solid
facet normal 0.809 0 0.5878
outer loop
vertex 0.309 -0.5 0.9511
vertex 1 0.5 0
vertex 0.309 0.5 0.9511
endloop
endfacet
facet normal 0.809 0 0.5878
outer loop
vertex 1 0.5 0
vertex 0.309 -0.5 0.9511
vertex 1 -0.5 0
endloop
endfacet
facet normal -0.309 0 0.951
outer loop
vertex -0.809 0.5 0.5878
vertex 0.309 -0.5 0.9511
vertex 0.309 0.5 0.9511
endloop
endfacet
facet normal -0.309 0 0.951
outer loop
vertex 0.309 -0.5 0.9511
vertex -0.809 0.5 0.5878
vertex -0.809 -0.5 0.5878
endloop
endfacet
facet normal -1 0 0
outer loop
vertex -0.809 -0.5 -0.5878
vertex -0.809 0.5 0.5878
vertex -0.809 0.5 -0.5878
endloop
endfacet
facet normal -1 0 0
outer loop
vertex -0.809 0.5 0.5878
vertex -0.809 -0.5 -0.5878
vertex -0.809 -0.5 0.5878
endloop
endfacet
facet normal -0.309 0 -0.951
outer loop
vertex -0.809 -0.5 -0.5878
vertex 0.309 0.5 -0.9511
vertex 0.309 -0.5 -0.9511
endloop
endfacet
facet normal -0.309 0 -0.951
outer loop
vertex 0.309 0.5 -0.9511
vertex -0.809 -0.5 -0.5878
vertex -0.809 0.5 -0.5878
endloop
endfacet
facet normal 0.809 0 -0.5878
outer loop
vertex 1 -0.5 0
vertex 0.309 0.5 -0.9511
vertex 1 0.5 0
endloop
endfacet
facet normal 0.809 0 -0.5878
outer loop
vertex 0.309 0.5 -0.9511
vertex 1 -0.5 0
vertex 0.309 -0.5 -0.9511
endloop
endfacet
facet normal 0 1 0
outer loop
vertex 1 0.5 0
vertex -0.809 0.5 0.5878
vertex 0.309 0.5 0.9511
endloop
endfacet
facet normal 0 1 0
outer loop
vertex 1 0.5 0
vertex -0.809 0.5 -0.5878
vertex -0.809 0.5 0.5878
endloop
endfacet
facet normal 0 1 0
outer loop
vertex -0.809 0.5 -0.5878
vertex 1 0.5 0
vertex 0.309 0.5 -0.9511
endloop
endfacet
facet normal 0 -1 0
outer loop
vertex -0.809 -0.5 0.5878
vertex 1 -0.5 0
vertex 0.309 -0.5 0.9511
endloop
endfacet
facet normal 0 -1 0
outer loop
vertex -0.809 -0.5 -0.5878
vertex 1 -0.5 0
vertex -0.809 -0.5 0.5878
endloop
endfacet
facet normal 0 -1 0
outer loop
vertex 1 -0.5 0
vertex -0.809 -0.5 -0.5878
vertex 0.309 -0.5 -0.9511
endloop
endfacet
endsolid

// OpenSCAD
minkowski() {
    linear_extrude(0.1) scale([0.4,0.4])import("native2_2d.dxf", center=true);
    rotate([90,0,0]) cylinder(r=1, h=1, center=true);
}
